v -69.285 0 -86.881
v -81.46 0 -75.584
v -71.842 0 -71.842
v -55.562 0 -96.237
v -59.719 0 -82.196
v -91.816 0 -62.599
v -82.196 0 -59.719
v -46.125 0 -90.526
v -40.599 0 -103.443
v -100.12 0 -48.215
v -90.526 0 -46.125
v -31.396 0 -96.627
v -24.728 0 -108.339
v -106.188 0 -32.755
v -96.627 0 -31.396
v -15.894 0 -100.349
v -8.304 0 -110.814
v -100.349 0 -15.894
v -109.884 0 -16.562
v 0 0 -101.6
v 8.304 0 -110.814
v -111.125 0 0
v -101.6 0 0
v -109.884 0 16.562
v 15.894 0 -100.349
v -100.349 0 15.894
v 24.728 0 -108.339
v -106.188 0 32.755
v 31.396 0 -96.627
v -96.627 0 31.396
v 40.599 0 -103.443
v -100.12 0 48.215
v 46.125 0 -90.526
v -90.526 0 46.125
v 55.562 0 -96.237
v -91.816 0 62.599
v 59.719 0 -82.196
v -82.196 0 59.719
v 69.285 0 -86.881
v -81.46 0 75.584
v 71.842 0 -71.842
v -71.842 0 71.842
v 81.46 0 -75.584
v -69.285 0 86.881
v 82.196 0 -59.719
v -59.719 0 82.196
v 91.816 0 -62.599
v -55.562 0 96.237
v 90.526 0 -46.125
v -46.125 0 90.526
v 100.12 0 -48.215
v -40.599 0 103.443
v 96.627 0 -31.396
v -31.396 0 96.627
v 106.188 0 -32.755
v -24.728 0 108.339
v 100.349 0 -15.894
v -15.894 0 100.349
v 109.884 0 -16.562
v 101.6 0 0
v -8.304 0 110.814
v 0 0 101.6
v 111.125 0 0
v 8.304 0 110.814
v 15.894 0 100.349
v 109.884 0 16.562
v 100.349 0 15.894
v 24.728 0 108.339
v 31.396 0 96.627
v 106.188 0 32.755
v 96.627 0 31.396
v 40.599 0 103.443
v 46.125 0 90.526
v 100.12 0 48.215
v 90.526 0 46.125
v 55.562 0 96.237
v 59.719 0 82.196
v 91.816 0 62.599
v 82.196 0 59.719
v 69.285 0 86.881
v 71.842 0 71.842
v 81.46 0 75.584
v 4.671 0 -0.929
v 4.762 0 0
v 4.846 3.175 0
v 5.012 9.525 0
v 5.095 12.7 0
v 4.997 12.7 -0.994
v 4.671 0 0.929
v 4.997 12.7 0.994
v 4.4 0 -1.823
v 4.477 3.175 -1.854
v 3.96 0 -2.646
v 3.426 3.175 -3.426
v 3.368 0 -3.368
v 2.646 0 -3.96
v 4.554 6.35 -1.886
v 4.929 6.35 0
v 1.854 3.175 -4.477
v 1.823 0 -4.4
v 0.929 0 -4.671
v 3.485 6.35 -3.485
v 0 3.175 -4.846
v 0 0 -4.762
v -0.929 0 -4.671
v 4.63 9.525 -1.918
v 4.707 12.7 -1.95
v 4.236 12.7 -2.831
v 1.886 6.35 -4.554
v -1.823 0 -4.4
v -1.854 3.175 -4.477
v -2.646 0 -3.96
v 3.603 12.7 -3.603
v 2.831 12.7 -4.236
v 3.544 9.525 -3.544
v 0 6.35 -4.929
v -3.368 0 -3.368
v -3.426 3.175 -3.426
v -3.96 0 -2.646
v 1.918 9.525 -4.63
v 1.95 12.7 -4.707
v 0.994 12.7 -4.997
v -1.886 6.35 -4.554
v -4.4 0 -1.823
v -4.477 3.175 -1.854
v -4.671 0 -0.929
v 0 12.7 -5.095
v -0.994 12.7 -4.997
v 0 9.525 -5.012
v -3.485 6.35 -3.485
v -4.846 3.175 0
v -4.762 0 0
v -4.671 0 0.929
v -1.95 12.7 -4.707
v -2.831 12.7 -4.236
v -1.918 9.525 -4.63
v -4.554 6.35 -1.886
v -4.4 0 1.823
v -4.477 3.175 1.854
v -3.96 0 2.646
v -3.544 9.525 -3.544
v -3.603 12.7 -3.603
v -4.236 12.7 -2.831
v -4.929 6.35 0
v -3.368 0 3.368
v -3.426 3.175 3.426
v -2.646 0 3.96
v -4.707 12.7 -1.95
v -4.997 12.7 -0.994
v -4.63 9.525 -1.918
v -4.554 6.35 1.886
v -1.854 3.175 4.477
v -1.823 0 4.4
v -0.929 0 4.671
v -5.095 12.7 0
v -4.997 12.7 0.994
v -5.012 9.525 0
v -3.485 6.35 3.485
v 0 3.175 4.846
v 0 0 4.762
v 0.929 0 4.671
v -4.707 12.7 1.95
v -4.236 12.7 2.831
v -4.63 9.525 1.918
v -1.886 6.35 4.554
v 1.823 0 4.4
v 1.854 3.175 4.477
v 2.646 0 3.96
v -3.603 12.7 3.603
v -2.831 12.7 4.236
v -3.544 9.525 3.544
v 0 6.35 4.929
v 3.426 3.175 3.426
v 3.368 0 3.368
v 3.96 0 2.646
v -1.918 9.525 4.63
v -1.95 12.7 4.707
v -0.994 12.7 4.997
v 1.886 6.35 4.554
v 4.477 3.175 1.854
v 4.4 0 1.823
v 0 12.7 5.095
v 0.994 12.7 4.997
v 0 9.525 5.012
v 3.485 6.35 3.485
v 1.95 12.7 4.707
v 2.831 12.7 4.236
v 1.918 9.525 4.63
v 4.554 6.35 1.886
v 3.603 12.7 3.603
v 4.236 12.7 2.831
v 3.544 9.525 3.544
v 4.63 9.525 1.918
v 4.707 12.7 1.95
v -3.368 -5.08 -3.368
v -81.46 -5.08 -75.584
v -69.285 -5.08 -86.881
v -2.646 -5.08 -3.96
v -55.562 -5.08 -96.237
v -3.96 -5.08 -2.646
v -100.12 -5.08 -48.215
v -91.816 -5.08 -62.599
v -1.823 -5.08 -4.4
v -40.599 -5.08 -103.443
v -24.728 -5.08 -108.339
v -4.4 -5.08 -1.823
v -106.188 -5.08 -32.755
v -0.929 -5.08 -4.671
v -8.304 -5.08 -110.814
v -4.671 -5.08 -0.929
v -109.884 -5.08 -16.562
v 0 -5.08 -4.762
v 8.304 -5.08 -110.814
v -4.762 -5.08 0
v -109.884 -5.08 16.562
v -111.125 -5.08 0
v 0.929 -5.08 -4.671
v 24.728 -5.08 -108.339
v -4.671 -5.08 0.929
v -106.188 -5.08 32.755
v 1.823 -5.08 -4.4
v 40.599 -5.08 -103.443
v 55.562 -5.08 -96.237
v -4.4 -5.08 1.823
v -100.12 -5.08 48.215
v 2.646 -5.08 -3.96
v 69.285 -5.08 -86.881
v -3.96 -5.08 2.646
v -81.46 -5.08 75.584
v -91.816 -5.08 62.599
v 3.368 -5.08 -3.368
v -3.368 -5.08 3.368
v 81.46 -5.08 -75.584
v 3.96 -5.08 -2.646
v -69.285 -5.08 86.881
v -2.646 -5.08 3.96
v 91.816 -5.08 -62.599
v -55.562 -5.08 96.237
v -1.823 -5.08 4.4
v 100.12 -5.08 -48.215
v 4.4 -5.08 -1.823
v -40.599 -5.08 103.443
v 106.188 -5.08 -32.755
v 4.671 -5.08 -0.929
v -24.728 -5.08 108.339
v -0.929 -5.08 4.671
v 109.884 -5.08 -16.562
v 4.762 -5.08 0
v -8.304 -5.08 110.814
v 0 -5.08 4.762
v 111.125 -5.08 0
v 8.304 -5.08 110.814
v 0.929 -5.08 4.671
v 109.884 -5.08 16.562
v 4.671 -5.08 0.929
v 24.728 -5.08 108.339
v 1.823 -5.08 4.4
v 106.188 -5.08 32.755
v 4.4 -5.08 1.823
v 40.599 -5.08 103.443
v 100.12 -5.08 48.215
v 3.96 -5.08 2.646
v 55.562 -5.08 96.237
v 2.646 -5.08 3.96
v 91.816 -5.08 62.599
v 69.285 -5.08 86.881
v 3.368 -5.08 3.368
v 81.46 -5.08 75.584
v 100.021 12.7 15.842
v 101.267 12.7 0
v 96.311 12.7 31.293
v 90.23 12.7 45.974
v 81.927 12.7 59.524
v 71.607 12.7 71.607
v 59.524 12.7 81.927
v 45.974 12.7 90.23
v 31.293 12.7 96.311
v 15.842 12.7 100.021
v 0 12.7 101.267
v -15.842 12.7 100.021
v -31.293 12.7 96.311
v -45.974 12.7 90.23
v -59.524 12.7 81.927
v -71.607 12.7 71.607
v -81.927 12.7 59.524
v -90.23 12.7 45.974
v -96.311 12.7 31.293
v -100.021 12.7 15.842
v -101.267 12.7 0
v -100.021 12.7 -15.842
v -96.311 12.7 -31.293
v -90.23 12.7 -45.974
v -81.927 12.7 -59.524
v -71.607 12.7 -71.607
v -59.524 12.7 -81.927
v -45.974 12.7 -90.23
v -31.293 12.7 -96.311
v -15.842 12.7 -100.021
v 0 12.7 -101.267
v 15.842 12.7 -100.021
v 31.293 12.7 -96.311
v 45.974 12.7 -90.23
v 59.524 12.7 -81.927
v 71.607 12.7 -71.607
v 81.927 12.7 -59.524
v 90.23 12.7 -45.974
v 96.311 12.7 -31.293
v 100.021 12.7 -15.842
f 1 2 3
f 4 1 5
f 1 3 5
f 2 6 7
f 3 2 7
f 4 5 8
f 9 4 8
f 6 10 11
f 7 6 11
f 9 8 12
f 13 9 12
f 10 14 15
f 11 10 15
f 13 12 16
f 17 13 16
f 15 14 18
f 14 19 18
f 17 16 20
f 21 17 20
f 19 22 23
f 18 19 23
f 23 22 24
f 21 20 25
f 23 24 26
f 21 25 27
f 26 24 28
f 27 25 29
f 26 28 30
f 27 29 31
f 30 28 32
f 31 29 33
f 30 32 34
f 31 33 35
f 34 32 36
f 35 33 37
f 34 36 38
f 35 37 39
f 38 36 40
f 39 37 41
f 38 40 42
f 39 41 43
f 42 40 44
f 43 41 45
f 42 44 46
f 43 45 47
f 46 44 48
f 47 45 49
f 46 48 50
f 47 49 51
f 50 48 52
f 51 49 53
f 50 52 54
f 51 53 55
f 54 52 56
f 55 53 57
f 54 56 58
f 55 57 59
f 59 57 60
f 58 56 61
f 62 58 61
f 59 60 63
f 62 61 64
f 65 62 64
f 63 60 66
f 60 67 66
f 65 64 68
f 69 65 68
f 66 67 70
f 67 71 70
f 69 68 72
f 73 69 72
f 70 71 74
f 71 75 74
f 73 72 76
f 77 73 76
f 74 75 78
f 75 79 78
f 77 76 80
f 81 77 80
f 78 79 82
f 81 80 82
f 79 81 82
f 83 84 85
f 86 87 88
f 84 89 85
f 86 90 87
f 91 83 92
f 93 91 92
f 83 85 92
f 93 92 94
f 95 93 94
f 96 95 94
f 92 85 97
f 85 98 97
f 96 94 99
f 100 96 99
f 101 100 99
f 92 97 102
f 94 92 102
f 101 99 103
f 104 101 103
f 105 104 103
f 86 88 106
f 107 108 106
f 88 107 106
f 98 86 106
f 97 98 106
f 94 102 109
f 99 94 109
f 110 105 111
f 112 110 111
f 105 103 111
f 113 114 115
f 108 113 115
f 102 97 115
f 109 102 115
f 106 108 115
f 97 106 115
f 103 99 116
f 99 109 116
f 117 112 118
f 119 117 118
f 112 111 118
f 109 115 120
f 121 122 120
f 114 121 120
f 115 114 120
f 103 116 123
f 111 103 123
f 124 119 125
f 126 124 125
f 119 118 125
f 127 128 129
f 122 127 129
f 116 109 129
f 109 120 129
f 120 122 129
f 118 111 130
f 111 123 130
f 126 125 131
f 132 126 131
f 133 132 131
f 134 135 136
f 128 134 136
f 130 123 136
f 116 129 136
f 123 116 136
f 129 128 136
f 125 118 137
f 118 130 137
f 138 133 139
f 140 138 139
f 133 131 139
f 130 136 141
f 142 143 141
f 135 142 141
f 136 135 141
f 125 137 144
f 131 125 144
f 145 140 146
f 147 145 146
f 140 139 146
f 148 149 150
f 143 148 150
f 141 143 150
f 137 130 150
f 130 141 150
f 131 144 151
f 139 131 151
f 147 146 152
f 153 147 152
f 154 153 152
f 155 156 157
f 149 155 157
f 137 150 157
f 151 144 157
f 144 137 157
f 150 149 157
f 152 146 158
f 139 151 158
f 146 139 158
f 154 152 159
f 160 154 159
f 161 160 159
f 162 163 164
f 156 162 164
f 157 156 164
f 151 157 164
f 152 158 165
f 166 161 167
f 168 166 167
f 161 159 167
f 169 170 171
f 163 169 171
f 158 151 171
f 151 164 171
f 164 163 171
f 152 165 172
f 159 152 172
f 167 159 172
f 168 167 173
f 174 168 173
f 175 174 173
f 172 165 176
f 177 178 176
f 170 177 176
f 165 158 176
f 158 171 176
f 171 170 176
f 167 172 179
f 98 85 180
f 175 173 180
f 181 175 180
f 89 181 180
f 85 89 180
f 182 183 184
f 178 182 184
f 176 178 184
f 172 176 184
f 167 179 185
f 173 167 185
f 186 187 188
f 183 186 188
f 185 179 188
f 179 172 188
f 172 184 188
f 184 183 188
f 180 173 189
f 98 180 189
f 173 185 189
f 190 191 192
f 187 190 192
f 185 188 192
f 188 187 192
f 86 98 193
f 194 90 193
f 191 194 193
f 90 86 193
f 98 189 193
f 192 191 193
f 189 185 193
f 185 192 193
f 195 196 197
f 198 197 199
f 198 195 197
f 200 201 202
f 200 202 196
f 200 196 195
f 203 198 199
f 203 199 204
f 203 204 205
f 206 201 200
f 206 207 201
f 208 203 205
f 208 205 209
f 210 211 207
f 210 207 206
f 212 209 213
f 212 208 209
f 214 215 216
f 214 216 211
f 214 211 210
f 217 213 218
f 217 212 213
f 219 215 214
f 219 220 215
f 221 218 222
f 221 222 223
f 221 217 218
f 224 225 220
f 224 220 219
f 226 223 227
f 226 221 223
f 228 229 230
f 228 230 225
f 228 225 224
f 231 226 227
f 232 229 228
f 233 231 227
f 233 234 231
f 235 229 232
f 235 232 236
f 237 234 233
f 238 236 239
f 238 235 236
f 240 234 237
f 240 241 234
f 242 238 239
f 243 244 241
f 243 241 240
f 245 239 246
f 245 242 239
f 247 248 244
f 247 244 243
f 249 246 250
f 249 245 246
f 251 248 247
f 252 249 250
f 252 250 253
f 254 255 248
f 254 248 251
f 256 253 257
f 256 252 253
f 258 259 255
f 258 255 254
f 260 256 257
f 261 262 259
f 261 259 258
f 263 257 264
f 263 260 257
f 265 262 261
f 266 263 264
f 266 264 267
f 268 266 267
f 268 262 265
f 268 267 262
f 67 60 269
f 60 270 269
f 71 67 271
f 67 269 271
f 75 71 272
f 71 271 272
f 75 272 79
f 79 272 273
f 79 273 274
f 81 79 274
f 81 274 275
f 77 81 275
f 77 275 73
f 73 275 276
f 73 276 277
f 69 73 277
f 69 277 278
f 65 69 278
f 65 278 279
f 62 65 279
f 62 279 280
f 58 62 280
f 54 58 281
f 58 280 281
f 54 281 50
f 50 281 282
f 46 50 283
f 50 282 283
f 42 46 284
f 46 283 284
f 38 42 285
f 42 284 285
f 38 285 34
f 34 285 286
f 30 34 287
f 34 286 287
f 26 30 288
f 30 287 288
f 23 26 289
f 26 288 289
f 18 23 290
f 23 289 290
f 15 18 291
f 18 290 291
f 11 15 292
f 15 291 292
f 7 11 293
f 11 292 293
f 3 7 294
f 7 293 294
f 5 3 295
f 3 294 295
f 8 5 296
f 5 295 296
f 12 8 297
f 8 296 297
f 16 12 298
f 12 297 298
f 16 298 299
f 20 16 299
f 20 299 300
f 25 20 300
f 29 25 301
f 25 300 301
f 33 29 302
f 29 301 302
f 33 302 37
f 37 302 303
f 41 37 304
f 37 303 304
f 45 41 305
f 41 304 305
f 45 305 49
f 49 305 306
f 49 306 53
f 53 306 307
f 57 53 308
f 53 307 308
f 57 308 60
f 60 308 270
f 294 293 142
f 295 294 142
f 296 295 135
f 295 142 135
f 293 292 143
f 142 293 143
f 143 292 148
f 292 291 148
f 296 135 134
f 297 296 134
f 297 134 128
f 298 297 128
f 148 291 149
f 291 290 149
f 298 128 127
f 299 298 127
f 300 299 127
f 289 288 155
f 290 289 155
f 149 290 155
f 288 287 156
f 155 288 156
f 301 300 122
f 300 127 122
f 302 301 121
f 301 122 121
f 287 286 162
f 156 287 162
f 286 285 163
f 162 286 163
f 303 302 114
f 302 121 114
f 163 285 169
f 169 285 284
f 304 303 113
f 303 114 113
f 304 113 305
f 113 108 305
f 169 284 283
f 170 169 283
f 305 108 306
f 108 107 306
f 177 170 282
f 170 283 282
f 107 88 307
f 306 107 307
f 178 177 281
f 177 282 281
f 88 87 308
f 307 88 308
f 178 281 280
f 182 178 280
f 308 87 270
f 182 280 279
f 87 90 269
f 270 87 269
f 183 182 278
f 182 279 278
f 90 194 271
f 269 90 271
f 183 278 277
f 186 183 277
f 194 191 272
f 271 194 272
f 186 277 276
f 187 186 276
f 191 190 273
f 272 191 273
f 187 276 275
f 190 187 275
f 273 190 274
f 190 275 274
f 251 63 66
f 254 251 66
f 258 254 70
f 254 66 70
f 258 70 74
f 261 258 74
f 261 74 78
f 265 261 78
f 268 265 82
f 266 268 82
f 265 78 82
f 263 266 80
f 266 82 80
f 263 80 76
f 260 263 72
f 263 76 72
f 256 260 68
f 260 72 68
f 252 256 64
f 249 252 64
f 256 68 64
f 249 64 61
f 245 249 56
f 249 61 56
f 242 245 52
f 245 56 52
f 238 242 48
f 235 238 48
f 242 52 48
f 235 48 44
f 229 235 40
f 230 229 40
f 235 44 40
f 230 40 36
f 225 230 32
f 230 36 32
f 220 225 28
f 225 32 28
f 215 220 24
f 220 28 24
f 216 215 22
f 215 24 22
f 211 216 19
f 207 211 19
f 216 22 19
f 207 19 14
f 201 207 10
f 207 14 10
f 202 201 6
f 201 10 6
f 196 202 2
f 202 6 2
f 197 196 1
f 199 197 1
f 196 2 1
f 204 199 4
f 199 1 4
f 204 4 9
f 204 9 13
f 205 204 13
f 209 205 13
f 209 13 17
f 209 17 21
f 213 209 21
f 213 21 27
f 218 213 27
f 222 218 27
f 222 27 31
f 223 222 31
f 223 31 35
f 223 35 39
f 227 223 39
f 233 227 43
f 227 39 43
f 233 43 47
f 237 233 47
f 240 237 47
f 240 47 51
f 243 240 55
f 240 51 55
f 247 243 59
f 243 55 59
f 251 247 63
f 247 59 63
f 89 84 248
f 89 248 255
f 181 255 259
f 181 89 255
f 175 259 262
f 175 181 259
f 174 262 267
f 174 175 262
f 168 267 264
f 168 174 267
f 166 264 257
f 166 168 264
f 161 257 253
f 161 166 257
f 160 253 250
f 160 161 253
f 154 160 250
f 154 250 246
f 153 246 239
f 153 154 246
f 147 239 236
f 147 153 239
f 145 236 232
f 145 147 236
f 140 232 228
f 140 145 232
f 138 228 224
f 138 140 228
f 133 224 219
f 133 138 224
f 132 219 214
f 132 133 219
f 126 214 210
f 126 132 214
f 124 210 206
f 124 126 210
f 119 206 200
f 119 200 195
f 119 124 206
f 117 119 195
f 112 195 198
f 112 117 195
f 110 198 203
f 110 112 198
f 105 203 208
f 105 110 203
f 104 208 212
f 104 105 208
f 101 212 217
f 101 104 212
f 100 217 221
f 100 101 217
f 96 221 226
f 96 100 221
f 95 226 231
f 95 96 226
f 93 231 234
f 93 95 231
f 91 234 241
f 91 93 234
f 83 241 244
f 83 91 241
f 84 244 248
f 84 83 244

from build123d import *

# Parameters (mm, degrees)
F0_R     = 101.6
F0_R_2   = 4.7625
F1_DEPTH = 12.7
F1_TAPER = 1.5
F0_R_3   = 111.125
F2_DEPTH = 5.08


with BuildPart() as f1:
    # F0 (on Front) → F1 (new body)
    with BuildSketch(Plane.XZ):
        Circle(F0_R)
        Circle(F0_R_2, mode=Mode.SUBTRACT)
    extrude(amount=-F1_DEPTH, taper=F1_TAPER)

    # F0 (on Front) → F2 (join)
    with BuildSketch(Plane.XZ):
        Circle(F0_R_3)
        Circle(F0_R, mode=Mode.SUBTRACT)
        Circle(F0_R)
        Circle(F0_R_2, mode=Mode.SUBTRACT)
    extrude(amount=F2_DEPTH)


solid = f1.part
